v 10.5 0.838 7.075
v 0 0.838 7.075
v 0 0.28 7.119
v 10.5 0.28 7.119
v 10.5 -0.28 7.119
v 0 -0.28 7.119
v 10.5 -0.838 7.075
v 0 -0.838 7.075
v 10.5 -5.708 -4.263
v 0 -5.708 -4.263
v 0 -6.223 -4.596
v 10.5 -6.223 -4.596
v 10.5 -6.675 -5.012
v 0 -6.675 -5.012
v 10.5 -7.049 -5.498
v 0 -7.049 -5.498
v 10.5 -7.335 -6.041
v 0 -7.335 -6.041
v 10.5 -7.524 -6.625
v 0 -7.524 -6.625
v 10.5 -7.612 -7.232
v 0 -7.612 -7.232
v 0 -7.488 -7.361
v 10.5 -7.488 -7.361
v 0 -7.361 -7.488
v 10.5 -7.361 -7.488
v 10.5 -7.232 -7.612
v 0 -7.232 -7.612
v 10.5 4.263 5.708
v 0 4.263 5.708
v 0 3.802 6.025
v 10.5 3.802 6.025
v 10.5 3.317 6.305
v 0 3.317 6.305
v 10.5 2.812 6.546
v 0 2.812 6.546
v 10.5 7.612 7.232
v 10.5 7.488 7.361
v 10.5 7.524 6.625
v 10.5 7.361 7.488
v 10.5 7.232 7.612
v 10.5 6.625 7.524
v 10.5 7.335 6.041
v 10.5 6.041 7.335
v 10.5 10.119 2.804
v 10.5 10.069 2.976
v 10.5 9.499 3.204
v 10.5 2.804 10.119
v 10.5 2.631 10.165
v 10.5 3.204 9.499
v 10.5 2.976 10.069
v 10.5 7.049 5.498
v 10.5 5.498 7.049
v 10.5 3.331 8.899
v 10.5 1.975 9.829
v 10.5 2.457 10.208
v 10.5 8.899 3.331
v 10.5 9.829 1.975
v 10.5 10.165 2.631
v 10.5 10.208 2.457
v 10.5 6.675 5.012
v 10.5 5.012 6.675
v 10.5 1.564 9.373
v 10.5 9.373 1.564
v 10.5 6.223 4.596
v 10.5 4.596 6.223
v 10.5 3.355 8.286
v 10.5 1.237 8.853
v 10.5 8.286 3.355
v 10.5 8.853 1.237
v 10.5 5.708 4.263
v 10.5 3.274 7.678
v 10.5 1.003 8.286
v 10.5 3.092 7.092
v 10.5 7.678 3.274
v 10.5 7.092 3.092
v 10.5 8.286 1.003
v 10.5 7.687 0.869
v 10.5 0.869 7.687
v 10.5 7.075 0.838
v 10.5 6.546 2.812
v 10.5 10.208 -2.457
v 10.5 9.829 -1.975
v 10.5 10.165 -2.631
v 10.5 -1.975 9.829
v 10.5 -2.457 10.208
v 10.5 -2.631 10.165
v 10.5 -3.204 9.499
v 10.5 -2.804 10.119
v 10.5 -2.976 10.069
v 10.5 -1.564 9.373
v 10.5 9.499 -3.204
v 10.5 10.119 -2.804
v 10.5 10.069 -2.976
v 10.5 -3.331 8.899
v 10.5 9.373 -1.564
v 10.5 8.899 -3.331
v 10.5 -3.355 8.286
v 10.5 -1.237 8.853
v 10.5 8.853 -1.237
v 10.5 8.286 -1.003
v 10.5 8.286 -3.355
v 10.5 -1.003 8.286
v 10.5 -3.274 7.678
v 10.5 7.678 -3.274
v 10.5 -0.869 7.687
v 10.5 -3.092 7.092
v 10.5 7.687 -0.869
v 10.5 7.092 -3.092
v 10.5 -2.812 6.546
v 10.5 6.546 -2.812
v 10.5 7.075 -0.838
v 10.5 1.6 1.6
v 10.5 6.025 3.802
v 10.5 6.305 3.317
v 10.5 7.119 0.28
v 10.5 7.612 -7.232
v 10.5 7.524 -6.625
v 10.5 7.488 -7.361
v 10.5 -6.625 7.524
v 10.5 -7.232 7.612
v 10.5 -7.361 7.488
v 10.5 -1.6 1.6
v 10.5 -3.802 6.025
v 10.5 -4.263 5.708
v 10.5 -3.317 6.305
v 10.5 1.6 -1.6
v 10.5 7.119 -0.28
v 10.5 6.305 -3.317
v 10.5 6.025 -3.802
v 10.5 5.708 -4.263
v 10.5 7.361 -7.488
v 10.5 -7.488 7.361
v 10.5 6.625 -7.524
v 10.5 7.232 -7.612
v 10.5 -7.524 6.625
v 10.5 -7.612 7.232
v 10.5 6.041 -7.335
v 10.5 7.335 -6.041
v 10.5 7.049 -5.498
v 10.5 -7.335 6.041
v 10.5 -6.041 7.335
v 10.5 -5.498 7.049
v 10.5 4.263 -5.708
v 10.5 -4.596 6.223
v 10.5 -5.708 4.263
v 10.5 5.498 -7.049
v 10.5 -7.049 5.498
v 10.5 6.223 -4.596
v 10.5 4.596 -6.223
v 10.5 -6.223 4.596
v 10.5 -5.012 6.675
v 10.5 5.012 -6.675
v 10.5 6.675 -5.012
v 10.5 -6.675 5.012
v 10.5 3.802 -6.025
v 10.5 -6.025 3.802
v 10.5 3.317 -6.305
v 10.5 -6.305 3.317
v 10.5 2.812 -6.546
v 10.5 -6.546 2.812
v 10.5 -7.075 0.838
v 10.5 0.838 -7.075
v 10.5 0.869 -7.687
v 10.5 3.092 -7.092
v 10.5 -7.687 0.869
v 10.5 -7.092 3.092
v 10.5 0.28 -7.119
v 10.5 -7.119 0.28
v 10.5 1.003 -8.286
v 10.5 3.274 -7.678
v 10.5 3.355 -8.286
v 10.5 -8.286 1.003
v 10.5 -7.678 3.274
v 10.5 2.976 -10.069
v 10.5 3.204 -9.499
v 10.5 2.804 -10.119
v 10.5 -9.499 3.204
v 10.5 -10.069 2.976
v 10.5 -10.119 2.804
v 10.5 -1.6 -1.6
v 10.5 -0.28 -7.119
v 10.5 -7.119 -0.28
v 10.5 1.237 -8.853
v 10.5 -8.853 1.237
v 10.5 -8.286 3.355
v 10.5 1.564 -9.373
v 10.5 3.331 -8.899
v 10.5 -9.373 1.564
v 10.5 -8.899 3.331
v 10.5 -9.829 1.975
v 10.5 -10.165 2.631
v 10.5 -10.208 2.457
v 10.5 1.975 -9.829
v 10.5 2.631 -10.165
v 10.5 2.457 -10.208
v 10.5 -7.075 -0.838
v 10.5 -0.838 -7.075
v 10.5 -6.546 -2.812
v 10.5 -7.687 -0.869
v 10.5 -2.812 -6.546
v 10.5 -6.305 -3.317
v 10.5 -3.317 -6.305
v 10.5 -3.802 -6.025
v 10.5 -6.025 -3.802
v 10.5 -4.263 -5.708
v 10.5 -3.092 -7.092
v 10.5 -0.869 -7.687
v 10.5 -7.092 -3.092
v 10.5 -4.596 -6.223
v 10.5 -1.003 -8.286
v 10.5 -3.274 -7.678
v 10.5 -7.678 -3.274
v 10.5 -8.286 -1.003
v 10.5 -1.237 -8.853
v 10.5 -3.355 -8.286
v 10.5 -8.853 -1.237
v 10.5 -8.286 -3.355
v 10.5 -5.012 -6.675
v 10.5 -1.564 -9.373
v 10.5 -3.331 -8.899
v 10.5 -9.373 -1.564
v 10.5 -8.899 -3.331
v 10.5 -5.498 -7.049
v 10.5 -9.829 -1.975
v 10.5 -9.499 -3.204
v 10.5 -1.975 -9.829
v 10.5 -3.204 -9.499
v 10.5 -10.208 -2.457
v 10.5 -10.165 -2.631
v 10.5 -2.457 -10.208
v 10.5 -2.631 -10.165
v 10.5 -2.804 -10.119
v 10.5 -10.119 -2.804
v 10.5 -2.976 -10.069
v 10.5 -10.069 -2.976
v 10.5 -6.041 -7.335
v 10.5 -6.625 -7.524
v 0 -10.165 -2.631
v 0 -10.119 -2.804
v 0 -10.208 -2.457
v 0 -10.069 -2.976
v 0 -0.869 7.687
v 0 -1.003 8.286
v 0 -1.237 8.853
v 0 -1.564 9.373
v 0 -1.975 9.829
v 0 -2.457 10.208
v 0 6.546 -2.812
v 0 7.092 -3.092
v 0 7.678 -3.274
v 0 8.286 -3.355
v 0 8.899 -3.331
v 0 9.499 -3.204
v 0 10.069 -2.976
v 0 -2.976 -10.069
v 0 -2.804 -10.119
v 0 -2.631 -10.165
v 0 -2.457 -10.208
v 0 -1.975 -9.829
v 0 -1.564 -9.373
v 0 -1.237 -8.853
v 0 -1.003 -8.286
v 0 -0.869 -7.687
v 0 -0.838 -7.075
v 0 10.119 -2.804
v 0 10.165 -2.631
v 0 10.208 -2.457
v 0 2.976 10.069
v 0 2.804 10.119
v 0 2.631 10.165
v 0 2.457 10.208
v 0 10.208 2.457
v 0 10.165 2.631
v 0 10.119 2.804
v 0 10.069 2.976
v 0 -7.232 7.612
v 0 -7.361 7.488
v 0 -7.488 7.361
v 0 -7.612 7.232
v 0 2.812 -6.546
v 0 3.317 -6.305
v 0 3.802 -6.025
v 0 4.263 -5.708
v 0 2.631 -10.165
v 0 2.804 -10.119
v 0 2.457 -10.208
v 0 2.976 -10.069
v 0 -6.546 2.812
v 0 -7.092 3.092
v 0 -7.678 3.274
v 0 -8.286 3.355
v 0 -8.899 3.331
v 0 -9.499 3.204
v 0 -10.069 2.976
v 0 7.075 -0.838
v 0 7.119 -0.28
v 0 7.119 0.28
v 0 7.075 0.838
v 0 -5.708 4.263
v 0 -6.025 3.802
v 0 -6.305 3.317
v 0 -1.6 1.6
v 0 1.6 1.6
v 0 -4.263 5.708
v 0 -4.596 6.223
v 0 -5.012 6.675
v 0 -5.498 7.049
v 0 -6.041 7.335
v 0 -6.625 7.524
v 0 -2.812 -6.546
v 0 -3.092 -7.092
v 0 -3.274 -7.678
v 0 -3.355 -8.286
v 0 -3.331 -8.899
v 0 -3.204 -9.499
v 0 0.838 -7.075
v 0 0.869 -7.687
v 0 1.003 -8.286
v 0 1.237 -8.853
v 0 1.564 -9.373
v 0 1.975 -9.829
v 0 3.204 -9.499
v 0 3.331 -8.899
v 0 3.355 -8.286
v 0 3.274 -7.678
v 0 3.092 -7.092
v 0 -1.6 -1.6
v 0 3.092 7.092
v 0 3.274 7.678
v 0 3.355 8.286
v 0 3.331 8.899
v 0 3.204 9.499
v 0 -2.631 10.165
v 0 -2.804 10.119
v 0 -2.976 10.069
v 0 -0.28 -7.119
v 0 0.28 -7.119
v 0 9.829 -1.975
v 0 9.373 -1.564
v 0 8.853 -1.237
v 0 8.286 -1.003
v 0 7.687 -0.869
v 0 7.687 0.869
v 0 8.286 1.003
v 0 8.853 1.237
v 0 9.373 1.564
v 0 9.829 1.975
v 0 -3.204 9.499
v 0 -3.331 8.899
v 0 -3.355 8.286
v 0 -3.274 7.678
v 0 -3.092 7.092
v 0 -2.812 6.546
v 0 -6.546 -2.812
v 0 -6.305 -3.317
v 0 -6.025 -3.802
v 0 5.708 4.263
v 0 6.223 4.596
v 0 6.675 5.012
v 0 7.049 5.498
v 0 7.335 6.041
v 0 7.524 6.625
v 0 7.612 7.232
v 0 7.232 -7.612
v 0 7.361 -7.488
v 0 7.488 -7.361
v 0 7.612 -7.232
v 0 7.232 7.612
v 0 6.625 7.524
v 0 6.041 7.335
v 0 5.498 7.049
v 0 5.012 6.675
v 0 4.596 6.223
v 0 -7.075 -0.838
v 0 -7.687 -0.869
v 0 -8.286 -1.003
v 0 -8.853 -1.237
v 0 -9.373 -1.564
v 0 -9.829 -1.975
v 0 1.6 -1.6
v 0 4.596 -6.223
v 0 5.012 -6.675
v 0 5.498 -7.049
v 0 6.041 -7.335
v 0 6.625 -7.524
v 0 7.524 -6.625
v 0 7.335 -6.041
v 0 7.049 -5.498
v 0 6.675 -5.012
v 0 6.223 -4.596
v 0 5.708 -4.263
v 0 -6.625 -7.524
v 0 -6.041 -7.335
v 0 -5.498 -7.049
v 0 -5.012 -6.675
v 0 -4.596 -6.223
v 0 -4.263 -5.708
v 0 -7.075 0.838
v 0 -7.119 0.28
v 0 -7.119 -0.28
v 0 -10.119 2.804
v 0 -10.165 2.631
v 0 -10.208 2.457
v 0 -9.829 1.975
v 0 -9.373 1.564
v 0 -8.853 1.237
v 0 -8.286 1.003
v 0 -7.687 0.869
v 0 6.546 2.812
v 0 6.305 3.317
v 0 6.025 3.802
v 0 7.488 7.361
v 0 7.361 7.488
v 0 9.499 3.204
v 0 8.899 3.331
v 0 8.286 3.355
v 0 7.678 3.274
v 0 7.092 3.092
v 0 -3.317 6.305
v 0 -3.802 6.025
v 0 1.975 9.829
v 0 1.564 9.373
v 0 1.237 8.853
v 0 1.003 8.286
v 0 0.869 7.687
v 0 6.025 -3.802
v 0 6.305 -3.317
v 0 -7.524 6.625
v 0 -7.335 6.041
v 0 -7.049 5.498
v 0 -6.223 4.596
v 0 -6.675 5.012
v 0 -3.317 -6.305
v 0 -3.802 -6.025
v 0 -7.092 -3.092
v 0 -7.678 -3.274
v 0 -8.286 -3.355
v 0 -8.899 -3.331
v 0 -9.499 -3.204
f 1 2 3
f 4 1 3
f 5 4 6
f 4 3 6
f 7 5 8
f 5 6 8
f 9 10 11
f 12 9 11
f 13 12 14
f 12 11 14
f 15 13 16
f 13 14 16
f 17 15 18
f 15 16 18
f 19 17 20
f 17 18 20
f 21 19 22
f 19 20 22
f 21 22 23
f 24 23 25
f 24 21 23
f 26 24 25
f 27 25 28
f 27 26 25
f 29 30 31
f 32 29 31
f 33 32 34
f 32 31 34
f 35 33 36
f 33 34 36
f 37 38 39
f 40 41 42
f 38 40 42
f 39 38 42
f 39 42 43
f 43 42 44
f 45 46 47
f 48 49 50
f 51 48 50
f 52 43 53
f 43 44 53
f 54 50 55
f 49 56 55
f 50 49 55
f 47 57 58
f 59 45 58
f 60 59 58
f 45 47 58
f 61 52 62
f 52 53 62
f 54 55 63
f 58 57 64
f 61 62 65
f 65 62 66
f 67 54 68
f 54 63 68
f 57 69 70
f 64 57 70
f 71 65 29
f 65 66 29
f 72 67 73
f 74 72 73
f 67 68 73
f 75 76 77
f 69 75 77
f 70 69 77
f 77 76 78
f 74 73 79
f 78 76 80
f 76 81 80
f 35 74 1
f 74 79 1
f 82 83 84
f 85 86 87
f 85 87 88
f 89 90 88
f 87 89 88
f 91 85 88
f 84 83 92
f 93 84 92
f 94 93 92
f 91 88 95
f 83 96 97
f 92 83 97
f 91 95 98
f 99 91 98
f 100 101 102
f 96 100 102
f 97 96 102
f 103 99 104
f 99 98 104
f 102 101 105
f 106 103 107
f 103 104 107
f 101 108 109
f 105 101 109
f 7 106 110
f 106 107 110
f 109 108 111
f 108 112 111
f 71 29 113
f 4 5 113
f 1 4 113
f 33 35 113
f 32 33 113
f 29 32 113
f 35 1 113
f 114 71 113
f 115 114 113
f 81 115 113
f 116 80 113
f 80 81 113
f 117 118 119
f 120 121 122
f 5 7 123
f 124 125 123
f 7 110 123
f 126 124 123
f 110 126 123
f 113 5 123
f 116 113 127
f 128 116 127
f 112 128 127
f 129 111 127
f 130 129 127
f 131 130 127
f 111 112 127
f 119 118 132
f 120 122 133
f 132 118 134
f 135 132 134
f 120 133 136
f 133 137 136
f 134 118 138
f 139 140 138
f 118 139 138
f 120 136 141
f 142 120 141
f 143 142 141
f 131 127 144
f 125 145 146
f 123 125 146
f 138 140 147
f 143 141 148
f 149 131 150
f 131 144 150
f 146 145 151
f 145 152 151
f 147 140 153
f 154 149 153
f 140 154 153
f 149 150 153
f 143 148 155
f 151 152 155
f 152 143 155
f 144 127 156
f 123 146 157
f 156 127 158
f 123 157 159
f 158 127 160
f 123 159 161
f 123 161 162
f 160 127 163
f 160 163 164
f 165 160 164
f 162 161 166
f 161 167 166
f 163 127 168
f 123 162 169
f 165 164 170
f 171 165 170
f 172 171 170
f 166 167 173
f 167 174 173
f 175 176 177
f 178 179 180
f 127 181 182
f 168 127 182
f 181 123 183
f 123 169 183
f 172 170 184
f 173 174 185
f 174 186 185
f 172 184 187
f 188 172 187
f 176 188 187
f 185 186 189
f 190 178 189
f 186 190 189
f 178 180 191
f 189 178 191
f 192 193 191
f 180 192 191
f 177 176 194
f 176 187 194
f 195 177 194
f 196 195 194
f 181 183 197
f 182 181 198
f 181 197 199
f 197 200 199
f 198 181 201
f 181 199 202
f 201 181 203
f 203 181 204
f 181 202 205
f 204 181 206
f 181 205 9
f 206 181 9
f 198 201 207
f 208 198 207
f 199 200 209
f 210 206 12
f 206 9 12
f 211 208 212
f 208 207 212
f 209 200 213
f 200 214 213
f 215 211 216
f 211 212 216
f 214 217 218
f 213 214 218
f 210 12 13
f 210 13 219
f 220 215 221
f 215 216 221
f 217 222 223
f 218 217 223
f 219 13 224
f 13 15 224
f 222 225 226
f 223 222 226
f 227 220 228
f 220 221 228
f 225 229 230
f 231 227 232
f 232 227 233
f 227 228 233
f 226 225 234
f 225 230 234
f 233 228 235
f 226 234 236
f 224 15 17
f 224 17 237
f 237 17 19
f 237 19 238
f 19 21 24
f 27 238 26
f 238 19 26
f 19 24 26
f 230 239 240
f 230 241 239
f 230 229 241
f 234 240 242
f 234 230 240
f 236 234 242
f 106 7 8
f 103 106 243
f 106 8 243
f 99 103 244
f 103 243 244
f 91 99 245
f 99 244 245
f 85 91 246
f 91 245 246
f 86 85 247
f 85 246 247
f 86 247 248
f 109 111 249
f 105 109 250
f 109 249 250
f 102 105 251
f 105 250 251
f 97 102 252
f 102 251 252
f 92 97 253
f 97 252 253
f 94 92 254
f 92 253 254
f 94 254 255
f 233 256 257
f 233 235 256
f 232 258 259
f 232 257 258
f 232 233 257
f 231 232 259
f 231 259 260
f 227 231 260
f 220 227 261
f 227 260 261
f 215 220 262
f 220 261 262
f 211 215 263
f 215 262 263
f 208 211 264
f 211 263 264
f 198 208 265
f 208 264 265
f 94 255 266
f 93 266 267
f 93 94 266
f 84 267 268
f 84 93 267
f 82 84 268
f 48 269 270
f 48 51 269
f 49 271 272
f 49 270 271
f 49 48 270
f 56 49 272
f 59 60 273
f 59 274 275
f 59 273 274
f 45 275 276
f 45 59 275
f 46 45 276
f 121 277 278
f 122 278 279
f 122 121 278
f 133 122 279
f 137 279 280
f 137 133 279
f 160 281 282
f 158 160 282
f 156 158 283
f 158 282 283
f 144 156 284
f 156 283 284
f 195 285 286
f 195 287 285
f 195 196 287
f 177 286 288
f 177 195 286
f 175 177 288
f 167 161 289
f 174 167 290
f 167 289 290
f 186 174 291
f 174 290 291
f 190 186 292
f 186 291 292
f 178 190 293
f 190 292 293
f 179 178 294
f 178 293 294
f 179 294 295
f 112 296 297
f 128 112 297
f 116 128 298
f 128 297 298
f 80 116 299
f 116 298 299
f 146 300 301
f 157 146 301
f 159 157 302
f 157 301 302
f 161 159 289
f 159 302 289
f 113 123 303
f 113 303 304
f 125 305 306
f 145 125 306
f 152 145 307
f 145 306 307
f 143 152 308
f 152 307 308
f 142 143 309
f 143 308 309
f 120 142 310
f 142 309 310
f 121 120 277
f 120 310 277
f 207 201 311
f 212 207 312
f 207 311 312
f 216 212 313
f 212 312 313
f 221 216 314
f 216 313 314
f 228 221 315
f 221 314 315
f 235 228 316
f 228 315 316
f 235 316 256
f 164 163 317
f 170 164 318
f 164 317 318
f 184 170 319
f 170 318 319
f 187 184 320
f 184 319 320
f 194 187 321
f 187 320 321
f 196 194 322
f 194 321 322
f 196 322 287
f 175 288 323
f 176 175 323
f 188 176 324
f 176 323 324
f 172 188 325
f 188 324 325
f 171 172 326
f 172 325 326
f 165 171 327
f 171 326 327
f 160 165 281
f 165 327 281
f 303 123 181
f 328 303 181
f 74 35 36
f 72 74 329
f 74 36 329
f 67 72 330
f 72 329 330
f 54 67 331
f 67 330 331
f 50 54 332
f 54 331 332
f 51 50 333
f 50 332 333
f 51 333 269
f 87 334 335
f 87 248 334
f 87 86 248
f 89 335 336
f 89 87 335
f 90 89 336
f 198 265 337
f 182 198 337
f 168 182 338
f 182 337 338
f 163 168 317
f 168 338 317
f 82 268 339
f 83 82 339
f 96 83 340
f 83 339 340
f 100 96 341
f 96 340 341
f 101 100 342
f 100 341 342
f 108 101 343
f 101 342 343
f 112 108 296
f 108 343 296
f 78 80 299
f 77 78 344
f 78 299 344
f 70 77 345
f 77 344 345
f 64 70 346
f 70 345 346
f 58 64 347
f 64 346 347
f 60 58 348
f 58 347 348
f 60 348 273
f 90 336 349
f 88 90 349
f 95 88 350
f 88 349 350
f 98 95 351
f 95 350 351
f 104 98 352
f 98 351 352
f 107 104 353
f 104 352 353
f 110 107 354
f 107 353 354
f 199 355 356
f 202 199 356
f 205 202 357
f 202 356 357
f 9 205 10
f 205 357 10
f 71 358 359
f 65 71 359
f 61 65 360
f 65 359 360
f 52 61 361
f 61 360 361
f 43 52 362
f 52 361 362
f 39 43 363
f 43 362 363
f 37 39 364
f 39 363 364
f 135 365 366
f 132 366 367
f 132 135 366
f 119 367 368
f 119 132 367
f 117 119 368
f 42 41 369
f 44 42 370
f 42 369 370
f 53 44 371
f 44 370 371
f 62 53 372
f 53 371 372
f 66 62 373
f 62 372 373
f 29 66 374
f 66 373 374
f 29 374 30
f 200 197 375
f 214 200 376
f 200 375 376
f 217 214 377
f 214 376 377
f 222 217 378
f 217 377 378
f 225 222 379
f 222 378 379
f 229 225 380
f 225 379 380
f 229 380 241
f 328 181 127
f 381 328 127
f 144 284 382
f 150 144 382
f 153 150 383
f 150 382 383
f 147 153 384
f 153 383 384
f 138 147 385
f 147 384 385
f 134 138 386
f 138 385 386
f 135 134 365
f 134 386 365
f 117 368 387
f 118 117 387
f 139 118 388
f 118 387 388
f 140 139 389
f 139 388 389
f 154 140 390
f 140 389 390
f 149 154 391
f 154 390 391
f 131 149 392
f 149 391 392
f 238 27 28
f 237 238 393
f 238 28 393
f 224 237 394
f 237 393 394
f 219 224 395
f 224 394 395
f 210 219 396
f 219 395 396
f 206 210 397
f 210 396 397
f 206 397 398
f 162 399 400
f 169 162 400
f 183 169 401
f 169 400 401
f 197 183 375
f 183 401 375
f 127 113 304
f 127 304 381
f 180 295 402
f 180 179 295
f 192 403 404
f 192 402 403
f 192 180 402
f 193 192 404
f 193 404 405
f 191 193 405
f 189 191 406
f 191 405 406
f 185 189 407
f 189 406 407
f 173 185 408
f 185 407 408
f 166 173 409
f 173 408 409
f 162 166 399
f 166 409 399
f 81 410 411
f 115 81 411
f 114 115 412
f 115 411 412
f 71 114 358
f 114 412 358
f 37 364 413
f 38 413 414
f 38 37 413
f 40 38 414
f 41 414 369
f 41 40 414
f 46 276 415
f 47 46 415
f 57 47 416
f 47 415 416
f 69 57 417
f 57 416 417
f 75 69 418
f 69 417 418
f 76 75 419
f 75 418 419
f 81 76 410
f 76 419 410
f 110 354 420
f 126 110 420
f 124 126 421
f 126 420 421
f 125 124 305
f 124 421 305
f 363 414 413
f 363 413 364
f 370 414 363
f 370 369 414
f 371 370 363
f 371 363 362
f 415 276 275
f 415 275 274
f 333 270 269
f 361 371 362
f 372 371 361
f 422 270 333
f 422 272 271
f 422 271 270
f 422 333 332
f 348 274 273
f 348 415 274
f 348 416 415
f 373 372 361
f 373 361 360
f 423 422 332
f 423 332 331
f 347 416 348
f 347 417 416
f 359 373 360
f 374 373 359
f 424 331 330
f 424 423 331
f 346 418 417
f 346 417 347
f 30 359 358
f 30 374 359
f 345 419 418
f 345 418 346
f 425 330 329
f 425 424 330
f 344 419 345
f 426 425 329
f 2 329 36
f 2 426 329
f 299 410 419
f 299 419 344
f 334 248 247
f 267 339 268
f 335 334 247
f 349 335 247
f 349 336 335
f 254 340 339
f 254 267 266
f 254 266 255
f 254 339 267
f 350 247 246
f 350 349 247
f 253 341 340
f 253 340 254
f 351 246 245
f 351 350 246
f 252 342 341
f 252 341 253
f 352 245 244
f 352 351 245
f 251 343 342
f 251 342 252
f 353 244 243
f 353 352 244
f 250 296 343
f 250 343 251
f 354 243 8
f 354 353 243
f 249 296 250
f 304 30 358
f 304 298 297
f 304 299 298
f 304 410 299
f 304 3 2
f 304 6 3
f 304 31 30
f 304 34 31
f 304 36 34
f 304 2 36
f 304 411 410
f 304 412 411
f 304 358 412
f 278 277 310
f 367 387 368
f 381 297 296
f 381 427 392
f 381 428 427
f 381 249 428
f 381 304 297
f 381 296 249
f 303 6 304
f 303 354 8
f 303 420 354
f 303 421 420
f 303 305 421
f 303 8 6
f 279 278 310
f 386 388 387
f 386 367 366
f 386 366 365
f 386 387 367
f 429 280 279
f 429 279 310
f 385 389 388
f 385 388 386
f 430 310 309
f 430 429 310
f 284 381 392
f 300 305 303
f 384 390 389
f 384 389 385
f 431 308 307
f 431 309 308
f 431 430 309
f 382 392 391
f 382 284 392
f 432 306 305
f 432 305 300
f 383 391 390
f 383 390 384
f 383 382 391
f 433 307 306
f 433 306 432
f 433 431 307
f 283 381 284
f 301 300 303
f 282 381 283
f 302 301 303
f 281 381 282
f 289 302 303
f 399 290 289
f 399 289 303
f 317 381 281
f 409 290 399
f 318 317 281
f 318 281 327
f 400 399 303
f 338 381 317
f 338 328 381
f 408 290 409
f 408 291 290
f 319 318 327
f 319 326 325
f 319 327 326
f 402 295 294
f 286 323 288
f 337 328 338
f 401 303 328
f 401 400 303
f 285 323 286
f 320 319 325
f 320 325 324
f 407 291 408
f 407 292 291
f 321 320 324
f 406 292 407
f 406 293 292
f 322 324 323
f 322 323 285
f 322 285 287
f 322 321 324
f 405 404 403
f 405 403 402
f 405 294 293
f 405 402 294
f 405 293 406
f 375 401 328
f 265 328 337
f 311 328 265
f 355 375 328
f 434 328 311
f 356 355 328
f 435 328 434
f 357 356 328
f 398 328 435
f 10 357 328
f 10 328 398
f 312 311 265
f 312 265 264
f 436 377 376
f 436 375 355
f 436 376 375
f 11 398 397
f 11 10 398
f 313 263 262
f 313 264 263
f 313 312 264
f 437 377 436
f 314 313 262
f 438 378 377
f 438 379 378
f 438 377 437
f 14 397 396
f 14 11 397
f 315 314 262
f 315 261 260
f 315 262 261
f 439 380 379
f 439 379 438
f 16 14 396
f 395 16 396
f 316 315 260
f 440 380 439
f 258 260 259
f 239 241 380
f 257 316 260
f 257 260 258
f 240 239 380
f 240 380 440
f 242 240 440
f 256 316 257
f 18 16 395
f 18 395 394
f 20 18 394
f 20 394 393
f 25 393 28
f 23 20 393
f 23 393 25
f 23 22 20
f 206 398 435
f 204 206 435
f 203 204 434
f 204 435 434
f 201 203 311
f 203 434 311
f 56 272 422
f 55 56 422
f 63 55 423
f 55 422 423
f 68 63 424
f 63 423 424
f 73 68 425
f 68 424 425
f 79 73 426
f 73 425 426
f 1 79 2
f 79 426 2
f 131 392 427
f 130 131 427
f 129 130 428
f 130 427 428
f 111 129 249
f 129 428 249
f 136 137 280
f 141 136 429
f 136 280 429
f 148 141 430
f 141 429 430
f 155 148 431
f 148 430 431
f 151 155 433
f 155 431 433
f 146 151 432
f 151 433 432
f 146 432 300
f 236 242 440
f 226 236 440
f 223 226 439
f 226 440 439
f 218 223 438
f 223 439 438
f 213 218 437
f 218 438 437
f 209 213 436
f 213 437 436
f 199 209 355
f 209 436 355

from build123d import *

# Parameters (mm, degrees)
BASPROSKE_W        = 10.5
BASPROSKE_H        = 10.5
TOOTHCUT_DEPTH     = 19.186533479
TEETHCUTS_COUNT    = 12
TEETHCUTS_ANGLE    = 330
BORSKE_R           = 0.5
BORE_DEPTH         = 50.0000508
SKETCH1_W          = 3.2
SKETCH1_H          = 3.2
CUT_EXTRUDE1_DEPTH = 30


with BuildPart() as part:
    # BasProSke → Base-Revolve (revolve)
    with BuildSketch(Plane(origin=(0, 0, 0), x_dir=(1, 0, 0), z_dir=(0, 1, 0)), mode=Mode.PRIVATE) as base_revolve_sk:
        with Locations((5.25, 5.25)):
            Rectangle(BASPROSKE_W, BASPROSKE_H)
    revolve(base_revolve_sk.sketch.rotate(Axis((-10, 0, 0), (1, 0, 0)), 180), axis=Axis((-10, 0, 0), (1, 0, 0)))

    # TooCutSke → ToothCut (cut, through all)
    with BuildSketch(Plane(origin=(0, 0, 0), x_dir=(0, 0, -1), z_dir=(1, 0, 0))):
        with BuildLine():
            ThreePointArc((0.837751456, 7.074570552), (0, 7.124), (-0.837751456, 7.074570552))
            ThreePointArc((-0.837751456, 7.074570552), (-1.245380016, 8.868946541), (-2.486473743, 10.227487154))
            ThreePointArc((-2.486473743, 10.227487154), (0, 10.5254), (2.486473743, 10.227487154))
            ThreePointArc((2.486473743, 10.227487154), (1.245380016, 8.868946541), (0.837751456, 7.074570552))
        make_face()
    toothcut = extrude(amount=TOOTHCUT_DEPTH, mode=Mode.SUBTRACT)

    # TeethCuts: ToothCut ×12 about axis
    teethcuts_axis = Axis((-10, 0, 0), (1, 0, 0))
    for i in range(1, TEETHCUTS_COUNT):
        add(toothcut.rotate(teethcuts_axis, i * TEETHCUTS_ANGLE / (TEETHCUTS_COUNT - 1)), mode=Mode.SUBTRACT)

    # BorSke → Bore (cut, symmetric)
    with BuildSketch(Plane(origin=(0, 0, 0), x_dir=(0, 0, -1), z_dir=(1, 0, 0))):
        with Locations(Location((0, 0, 0), (0, 0, 180))):
            Circle(BORSKE_R)
    extrude(amount=BORE_DEPTH, both=True, mode=Mode.SUBTRACT)

    # Sketch1 → Cut-Extrude1 (cut)
    with BuildSketch(Plane(origin=(10.5, 0, 0), x_dir=(0, 0, -1), z_dir=(1, 0, 0))):
        Rectangle(SKETCH1_W, SKETCH1_H)
    extrude(amount=-CUT_EXTRUDE1_DEPTH, mode=Mode.SUBTRACT)


solid = part.part
